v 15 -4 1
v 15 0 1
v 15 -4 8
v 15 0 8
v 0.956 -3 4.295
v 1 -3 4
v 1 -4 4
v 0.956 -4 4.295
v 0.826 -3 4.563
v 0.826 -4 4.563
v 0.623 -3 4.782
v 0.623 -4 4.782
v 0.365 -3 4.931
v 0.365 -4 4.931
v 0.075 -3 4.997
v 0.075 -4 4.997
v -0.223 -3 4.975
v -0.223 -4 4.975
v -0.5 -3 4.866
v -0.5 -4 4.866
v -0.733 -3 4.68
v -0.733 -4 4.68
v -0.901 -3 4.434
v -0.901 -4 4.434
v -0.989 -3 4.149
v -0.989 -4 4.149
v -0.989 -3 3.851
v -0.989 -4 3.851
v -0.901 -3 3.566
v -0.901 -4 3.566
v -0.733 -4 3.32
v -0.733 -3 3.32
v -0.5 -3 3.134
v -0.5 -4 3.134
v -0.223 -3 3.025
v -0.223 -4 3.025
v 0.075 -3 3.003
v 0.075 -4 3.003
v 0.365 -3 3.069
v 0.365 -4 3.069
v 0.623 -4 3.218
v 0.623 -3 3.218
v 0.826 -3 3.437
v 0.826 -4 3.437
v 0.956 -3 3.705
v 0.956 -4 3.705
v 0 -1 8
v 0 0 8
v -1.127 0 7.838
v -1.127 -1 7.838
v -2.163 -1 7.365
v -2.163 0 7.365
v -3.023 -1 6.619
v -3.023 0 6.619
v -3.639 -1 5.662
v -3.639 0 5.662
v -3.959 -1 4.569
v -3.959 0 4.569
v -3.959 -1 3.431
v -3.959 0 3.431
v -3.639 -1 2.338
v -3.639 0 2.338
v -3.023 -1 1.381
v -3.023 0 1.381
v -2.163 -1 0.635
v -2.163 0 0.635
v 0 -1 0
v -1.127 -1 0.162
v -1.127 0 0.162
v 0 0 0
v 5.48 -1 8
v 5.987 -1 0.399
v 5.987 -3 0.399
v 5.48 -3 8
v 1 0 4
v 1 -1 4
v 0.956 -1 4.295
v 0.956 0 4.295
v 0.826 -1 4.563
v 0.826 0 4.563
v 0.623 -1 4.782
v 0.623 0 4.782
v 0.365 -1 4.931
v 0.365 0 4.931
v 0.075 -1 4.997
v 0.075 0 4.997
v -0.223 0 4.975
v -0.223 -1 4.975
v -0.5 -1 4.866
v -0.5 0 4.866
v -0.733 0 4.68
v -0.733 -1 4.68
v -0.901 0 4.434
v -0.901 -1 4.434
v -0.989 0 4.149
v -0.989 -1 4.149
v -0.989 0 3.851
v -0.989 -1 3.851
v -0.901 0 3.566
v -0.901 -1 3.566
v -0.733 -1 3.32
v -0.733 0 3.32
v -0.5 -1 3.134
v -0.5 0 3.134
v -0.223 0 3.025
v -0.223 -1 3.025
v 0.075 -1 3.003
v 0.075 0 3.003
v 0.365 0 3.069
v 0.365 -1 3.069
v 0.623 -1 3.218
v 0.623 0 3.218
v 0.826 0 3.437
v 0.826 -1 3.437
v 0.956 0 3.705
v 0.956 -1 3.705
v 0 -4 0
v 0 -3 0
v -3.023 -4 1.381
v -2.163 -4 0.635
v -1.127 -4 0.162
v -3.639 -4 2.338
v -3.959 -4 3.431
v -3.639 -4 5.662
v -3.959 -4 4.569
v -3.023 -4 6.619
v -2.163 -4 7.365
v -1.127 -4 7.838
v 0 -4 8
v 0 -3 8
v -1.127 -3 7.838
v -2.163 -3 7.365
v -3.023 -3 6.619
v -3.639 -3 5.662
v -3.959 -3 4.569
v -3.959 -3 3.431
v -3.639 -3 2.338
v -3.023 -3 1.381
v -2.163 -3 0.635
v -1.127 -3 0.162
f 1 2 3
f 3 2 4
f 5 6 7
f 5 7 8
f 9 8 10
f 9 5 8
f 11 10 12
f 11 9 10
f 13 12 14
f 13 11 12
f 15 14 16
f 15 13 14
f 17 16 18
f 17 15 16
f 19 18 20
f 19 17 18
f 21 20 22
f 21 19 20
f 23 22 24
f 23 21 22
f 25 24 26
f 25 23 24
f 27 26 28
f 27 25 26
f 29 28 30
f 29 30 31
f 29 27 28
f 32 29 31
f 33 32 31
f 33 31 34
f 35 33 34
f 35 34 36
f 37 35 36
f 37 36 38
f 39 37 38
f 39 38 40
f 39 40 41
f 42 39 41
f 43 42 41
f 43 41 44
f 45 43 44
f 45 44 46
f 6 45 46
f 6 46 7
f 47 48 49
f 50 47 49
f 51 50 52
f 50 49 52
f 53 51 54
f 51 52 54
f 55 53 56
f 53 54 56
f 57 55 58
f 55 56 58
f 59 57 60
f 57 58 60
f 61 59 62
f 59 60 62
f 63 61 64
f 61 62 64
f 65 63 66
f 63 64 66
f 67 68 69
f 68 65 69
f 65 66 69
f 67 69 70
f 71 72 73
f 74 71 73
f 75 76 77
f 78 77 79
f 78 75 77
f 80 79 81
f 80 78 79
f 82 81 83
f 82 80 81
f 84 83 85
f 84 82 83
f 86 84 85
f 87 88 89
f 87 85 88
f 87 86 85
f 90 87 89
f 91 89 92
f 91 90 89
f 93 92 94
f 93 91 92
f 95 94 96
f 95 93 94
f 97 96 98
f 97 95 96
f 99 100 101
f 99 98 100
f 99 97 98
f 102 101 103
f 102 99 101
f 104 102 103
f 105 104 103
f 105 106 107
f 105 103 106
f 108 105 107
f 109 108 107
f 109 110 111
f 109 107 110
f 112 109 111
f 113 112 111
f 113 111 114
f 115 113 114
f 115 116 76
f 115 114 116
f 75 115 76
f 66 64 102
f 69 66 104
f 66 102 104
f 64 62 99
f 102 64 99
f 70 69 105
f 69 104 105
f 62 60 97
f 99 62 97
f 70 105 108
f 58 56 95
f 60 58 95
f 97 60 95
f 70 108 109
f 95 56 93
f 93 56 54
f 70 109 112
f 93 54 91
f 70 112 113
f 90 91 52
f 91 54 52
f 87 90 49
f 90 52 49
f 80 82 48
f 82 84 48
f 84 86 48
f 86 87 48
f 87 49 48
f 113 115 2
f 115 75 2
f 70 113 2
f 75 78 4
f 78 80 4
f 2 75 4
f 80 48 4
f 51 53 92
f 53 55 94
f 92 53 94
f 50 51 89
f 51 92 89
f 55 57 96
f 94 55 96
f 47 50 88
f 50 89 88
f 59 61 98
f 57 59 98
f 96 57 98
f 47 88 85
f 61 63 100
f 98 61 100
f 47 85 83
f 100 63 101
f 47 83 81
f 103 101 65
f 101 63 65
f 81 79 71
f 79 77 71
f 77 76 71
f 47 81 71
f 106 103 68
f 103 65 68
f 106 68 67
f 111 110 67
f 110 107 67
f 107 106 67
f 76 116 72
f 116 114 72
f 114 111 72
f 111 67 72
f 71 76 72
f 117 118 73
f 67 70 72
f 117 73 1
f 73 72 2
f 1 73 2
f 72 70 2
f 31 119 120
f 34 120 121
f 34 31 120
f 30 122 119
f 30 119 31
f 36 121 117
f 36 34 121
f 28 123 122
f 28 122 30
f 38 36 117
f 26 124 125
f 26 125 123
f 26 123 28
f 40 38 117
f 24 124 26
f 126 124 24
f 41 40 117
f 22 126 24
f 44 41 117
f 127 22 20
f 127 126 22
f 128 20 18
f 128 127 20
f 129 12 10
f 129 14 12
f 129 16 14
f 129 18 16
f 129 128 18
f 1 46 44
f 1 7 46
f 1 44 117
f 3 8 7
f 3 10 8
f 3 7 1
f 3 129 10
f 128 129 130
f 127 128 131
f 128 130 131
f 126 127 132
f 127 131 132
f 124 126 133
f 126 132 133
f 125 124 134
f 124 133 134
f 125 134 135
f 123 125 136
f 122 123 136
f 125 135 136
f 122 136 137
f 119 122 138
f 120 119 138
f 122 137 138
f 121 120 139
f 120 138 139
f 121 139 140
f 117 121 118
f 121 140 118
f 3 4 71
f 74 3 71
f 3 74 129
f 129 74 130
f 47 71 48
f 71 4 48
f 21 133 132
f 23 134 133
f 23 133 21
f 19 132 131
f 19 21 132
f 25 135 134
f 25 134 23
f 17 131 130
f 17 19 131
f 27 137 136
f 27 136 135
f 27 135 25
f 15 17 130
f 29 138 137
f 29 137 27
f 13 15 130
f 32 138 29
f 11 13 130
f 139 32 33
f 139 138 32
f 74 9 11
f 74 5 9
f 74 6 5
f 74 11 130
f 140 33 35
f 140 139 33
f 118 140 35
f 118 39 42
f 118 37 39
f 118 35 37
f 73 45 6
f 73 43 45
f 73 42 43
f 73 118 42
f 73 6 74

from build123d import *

# Parameters (mm, degrees)
F0_R     = 1
F1_DEPTH = 4
F2_W     = 12
F2_H     = 2
F3_DEPTH = 8.249357


with BuildPart() as f1:
    # F0 (on Front) → F1 (new body)
    with BuildSketch(Plane.XZ):
        with BuildLine():
            Line((15, 8), (0, 8))
            ThreePointArc((0, 8), (-4, 4), (0, 0))
            Line((0, 0), (15, 1))
            Line((15, 1), (15, 8))
        make_face()
        with Locations((0, 4)):
            Circle(F0_R, mode=Mode.SUBTRACT)
    extrude(amount=F1_DEPTH)

    # F2 (on face) → F3 (cut, through all)
    with BuildSketch(Plane(origin=(0, 0, 0), x_dir=(0.997785, 0, 0.066519), z_dir=(0.066519, 0, -0.997785))):
        with Locations((0, 2)):
            Rectangle(F2_W, F2_H)
    extrude(amount=-F3_DEPTH, mode=Mode.SUBTRACT)


solid = f1.part
